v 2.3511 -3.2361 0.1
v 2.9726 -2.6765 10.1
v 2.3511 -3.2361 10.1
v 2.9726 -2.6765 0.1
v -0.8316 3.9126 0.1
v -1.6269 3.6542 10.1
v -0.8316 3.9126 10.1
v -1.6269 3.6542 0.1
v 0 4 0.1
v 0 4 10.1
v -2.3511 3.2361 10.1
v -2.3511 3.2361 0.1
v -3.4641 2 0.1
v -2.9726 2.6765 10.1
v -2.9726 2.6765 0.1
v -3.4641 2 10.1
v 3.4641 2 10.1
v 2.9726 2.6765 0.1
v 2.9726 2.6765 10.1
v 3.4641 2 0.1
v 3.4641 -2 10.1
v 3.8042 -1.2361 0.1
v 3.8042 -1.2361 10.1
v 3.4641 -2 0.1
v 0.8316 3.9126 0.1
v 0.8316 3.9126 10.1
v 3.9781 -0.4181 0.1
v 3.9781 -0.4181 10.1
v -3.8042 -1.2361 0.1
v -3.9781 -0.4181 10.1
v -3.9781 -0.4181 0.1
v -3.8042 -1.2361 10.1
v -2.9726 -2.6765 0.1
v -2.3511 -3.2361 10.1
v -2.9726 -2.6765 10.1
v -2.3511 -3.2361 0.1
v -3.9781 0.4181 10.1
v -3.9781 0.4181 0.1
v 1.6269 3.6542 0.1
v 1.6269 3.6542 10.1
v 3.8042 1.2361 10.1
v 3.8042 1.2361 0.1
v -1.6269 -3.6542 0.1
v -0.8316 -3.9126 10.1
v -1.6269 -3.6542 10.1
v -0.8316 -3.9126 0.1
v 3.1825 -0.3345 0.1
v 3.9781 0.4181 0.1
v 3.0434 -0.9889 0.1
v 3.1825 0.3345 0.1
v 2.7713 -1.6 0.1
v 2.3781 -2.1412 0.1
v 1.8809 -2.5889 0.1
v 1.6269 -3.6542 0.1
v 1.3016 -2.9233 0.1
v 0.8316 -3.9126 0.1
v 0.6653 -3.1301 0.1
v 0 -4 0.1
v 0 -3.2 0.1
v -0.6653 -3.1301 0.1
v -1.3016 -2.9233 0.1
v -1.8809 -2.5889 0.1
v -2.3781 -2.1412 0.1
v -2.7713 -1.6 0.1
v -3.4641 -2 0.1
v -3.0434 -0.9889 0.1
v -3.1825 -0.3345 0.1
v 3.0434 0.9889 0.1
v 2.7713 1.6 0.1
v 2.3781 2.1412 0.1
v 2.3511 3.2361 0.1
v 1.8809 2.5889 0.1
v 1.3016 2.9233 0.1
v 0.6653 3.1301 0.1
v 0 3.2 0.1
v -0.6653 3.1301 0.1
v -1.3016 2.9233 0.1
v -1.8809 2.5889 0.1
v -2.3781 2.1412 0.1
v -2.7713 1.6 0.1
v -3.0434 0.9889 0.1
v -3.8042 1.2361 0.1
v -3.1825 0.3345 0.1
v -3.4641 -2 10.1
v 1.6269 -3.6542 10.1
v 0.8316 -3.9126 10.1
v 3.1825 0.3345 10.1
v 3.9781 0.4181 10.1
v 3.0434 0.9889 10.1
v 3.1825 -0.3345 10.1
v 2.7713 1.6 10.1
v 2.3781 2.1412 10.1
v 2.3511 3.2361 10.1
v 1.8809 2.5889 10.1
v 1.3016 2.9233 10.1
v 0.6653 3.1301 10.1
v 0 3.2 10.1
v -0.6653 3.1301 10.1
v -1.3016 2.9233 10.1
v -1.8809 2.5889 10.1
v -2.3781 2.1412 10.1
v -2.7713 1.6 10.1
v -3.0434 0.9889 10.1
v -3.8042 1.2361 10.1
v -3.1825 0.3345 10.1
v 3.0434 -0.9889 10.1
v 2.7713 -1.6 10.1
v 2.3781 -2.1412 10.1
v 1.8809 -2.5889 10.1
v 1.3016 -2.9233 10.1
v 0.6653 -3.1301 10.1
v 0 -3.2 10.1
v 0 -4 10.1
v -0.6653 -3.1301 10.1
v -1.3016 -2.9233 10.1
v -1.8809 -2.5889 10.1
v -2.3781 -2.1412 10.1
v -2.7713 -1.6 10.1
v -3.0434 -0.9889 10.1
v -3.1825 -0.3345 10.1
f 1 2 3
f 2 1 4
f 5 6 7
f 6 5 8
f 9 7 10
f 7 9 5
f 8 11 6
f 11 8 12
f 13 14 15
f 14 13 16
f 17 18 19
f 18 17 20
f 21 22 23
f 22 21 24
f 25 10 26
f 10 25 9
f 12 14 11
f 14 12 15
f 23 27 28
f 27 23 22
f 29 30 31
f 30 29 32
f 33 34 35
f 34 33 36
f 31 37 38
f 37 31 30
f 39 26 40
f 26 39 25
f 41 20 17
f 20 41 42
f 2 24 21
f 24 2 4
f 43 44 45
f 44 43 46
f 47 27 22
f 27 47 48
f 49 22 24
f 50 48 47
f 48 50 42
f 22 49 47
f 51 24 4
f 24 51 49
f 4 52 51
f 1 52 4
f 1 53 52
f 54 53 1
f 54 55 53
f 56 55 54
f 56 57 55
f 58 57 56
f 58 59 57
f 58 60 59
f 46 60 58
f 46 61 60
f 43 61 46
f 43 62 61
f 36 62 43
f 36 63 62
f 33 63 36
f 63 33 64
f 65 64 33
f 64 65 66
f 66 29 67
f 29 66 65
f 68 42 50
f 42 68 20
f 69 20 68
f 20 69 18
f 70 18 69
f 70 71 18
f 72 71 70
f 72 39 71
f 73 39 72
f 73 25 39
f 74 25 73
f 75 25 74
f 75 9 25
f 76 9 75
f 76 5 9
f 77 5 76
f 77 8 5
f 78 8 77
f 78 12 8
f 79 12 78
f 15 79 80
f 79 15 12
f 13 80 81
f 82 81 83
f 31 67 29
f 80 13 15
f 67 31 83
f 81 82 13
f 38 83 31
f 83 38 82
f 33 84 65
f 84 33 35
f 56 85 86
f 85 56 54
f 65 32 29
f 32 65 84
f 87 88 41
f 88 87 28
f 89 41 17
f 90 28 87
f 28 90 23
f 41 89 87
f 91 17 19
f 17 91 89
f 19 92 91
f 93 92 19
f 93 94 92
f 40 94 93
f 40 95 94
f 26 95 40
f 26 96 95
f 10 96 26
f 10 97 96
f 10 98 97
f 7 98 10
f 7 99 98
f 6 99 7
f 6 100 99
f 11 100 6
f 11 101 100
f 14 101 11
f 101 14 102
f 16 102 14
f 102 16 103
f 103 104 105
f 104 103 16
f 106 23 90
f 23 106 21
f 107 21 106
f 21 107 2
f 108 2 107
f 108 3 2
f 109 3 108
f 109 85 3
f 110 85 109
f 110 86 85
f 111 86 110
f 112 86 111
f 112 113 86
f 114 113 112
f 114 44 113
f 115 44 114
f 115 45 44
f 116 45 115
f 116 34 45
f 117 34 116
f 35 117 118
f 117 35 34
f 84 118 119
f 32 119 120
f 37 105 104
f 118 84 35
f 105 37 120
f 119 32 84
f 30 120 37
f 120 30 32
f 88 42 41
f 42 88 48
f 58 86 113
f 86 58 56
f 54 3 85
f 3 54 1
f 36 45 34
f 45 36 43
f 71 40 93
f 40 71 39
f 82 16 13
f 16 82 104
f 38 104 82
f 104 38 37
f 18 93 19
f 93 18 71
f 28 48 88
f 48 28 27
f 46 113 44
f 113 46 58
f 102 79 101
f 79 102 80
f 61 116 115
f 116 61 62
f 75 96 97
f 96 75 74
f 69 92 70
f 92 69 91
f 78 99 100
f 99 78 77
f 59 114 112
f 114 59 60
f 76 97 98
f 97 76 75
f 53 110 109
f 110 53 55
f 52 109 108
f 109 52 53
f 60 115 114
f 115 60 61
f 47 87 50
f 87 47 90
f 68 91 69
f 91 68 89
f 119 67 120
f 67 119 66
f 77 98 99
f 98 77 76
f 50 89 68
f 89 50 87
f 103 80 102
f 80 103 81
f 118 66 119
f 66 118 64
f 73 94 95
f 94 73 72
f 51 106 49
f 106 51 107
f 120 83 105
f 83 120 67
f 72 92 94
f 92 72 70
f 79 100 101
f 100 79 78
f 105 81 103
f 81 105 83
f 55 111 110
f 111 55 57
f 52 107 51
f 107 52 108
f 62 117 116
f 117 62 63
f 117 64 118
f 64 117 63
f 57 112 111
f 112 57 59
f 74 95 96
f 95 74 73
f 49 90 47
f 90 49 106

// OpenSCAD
// C. Strang		
// cstrang@????
// funfor.us


$fn=30;

translate([0,0,0]) rotate([90,0,90])
	{
	difference()
		{
		translate([0,0.1,0]) rotate([-90,0,0]) cylinder(r=4,h=10.0);
		translate([0,0,0]) rotate([-90,0,0]) cylinder(r=3.2,h=10.2);
		}

}
